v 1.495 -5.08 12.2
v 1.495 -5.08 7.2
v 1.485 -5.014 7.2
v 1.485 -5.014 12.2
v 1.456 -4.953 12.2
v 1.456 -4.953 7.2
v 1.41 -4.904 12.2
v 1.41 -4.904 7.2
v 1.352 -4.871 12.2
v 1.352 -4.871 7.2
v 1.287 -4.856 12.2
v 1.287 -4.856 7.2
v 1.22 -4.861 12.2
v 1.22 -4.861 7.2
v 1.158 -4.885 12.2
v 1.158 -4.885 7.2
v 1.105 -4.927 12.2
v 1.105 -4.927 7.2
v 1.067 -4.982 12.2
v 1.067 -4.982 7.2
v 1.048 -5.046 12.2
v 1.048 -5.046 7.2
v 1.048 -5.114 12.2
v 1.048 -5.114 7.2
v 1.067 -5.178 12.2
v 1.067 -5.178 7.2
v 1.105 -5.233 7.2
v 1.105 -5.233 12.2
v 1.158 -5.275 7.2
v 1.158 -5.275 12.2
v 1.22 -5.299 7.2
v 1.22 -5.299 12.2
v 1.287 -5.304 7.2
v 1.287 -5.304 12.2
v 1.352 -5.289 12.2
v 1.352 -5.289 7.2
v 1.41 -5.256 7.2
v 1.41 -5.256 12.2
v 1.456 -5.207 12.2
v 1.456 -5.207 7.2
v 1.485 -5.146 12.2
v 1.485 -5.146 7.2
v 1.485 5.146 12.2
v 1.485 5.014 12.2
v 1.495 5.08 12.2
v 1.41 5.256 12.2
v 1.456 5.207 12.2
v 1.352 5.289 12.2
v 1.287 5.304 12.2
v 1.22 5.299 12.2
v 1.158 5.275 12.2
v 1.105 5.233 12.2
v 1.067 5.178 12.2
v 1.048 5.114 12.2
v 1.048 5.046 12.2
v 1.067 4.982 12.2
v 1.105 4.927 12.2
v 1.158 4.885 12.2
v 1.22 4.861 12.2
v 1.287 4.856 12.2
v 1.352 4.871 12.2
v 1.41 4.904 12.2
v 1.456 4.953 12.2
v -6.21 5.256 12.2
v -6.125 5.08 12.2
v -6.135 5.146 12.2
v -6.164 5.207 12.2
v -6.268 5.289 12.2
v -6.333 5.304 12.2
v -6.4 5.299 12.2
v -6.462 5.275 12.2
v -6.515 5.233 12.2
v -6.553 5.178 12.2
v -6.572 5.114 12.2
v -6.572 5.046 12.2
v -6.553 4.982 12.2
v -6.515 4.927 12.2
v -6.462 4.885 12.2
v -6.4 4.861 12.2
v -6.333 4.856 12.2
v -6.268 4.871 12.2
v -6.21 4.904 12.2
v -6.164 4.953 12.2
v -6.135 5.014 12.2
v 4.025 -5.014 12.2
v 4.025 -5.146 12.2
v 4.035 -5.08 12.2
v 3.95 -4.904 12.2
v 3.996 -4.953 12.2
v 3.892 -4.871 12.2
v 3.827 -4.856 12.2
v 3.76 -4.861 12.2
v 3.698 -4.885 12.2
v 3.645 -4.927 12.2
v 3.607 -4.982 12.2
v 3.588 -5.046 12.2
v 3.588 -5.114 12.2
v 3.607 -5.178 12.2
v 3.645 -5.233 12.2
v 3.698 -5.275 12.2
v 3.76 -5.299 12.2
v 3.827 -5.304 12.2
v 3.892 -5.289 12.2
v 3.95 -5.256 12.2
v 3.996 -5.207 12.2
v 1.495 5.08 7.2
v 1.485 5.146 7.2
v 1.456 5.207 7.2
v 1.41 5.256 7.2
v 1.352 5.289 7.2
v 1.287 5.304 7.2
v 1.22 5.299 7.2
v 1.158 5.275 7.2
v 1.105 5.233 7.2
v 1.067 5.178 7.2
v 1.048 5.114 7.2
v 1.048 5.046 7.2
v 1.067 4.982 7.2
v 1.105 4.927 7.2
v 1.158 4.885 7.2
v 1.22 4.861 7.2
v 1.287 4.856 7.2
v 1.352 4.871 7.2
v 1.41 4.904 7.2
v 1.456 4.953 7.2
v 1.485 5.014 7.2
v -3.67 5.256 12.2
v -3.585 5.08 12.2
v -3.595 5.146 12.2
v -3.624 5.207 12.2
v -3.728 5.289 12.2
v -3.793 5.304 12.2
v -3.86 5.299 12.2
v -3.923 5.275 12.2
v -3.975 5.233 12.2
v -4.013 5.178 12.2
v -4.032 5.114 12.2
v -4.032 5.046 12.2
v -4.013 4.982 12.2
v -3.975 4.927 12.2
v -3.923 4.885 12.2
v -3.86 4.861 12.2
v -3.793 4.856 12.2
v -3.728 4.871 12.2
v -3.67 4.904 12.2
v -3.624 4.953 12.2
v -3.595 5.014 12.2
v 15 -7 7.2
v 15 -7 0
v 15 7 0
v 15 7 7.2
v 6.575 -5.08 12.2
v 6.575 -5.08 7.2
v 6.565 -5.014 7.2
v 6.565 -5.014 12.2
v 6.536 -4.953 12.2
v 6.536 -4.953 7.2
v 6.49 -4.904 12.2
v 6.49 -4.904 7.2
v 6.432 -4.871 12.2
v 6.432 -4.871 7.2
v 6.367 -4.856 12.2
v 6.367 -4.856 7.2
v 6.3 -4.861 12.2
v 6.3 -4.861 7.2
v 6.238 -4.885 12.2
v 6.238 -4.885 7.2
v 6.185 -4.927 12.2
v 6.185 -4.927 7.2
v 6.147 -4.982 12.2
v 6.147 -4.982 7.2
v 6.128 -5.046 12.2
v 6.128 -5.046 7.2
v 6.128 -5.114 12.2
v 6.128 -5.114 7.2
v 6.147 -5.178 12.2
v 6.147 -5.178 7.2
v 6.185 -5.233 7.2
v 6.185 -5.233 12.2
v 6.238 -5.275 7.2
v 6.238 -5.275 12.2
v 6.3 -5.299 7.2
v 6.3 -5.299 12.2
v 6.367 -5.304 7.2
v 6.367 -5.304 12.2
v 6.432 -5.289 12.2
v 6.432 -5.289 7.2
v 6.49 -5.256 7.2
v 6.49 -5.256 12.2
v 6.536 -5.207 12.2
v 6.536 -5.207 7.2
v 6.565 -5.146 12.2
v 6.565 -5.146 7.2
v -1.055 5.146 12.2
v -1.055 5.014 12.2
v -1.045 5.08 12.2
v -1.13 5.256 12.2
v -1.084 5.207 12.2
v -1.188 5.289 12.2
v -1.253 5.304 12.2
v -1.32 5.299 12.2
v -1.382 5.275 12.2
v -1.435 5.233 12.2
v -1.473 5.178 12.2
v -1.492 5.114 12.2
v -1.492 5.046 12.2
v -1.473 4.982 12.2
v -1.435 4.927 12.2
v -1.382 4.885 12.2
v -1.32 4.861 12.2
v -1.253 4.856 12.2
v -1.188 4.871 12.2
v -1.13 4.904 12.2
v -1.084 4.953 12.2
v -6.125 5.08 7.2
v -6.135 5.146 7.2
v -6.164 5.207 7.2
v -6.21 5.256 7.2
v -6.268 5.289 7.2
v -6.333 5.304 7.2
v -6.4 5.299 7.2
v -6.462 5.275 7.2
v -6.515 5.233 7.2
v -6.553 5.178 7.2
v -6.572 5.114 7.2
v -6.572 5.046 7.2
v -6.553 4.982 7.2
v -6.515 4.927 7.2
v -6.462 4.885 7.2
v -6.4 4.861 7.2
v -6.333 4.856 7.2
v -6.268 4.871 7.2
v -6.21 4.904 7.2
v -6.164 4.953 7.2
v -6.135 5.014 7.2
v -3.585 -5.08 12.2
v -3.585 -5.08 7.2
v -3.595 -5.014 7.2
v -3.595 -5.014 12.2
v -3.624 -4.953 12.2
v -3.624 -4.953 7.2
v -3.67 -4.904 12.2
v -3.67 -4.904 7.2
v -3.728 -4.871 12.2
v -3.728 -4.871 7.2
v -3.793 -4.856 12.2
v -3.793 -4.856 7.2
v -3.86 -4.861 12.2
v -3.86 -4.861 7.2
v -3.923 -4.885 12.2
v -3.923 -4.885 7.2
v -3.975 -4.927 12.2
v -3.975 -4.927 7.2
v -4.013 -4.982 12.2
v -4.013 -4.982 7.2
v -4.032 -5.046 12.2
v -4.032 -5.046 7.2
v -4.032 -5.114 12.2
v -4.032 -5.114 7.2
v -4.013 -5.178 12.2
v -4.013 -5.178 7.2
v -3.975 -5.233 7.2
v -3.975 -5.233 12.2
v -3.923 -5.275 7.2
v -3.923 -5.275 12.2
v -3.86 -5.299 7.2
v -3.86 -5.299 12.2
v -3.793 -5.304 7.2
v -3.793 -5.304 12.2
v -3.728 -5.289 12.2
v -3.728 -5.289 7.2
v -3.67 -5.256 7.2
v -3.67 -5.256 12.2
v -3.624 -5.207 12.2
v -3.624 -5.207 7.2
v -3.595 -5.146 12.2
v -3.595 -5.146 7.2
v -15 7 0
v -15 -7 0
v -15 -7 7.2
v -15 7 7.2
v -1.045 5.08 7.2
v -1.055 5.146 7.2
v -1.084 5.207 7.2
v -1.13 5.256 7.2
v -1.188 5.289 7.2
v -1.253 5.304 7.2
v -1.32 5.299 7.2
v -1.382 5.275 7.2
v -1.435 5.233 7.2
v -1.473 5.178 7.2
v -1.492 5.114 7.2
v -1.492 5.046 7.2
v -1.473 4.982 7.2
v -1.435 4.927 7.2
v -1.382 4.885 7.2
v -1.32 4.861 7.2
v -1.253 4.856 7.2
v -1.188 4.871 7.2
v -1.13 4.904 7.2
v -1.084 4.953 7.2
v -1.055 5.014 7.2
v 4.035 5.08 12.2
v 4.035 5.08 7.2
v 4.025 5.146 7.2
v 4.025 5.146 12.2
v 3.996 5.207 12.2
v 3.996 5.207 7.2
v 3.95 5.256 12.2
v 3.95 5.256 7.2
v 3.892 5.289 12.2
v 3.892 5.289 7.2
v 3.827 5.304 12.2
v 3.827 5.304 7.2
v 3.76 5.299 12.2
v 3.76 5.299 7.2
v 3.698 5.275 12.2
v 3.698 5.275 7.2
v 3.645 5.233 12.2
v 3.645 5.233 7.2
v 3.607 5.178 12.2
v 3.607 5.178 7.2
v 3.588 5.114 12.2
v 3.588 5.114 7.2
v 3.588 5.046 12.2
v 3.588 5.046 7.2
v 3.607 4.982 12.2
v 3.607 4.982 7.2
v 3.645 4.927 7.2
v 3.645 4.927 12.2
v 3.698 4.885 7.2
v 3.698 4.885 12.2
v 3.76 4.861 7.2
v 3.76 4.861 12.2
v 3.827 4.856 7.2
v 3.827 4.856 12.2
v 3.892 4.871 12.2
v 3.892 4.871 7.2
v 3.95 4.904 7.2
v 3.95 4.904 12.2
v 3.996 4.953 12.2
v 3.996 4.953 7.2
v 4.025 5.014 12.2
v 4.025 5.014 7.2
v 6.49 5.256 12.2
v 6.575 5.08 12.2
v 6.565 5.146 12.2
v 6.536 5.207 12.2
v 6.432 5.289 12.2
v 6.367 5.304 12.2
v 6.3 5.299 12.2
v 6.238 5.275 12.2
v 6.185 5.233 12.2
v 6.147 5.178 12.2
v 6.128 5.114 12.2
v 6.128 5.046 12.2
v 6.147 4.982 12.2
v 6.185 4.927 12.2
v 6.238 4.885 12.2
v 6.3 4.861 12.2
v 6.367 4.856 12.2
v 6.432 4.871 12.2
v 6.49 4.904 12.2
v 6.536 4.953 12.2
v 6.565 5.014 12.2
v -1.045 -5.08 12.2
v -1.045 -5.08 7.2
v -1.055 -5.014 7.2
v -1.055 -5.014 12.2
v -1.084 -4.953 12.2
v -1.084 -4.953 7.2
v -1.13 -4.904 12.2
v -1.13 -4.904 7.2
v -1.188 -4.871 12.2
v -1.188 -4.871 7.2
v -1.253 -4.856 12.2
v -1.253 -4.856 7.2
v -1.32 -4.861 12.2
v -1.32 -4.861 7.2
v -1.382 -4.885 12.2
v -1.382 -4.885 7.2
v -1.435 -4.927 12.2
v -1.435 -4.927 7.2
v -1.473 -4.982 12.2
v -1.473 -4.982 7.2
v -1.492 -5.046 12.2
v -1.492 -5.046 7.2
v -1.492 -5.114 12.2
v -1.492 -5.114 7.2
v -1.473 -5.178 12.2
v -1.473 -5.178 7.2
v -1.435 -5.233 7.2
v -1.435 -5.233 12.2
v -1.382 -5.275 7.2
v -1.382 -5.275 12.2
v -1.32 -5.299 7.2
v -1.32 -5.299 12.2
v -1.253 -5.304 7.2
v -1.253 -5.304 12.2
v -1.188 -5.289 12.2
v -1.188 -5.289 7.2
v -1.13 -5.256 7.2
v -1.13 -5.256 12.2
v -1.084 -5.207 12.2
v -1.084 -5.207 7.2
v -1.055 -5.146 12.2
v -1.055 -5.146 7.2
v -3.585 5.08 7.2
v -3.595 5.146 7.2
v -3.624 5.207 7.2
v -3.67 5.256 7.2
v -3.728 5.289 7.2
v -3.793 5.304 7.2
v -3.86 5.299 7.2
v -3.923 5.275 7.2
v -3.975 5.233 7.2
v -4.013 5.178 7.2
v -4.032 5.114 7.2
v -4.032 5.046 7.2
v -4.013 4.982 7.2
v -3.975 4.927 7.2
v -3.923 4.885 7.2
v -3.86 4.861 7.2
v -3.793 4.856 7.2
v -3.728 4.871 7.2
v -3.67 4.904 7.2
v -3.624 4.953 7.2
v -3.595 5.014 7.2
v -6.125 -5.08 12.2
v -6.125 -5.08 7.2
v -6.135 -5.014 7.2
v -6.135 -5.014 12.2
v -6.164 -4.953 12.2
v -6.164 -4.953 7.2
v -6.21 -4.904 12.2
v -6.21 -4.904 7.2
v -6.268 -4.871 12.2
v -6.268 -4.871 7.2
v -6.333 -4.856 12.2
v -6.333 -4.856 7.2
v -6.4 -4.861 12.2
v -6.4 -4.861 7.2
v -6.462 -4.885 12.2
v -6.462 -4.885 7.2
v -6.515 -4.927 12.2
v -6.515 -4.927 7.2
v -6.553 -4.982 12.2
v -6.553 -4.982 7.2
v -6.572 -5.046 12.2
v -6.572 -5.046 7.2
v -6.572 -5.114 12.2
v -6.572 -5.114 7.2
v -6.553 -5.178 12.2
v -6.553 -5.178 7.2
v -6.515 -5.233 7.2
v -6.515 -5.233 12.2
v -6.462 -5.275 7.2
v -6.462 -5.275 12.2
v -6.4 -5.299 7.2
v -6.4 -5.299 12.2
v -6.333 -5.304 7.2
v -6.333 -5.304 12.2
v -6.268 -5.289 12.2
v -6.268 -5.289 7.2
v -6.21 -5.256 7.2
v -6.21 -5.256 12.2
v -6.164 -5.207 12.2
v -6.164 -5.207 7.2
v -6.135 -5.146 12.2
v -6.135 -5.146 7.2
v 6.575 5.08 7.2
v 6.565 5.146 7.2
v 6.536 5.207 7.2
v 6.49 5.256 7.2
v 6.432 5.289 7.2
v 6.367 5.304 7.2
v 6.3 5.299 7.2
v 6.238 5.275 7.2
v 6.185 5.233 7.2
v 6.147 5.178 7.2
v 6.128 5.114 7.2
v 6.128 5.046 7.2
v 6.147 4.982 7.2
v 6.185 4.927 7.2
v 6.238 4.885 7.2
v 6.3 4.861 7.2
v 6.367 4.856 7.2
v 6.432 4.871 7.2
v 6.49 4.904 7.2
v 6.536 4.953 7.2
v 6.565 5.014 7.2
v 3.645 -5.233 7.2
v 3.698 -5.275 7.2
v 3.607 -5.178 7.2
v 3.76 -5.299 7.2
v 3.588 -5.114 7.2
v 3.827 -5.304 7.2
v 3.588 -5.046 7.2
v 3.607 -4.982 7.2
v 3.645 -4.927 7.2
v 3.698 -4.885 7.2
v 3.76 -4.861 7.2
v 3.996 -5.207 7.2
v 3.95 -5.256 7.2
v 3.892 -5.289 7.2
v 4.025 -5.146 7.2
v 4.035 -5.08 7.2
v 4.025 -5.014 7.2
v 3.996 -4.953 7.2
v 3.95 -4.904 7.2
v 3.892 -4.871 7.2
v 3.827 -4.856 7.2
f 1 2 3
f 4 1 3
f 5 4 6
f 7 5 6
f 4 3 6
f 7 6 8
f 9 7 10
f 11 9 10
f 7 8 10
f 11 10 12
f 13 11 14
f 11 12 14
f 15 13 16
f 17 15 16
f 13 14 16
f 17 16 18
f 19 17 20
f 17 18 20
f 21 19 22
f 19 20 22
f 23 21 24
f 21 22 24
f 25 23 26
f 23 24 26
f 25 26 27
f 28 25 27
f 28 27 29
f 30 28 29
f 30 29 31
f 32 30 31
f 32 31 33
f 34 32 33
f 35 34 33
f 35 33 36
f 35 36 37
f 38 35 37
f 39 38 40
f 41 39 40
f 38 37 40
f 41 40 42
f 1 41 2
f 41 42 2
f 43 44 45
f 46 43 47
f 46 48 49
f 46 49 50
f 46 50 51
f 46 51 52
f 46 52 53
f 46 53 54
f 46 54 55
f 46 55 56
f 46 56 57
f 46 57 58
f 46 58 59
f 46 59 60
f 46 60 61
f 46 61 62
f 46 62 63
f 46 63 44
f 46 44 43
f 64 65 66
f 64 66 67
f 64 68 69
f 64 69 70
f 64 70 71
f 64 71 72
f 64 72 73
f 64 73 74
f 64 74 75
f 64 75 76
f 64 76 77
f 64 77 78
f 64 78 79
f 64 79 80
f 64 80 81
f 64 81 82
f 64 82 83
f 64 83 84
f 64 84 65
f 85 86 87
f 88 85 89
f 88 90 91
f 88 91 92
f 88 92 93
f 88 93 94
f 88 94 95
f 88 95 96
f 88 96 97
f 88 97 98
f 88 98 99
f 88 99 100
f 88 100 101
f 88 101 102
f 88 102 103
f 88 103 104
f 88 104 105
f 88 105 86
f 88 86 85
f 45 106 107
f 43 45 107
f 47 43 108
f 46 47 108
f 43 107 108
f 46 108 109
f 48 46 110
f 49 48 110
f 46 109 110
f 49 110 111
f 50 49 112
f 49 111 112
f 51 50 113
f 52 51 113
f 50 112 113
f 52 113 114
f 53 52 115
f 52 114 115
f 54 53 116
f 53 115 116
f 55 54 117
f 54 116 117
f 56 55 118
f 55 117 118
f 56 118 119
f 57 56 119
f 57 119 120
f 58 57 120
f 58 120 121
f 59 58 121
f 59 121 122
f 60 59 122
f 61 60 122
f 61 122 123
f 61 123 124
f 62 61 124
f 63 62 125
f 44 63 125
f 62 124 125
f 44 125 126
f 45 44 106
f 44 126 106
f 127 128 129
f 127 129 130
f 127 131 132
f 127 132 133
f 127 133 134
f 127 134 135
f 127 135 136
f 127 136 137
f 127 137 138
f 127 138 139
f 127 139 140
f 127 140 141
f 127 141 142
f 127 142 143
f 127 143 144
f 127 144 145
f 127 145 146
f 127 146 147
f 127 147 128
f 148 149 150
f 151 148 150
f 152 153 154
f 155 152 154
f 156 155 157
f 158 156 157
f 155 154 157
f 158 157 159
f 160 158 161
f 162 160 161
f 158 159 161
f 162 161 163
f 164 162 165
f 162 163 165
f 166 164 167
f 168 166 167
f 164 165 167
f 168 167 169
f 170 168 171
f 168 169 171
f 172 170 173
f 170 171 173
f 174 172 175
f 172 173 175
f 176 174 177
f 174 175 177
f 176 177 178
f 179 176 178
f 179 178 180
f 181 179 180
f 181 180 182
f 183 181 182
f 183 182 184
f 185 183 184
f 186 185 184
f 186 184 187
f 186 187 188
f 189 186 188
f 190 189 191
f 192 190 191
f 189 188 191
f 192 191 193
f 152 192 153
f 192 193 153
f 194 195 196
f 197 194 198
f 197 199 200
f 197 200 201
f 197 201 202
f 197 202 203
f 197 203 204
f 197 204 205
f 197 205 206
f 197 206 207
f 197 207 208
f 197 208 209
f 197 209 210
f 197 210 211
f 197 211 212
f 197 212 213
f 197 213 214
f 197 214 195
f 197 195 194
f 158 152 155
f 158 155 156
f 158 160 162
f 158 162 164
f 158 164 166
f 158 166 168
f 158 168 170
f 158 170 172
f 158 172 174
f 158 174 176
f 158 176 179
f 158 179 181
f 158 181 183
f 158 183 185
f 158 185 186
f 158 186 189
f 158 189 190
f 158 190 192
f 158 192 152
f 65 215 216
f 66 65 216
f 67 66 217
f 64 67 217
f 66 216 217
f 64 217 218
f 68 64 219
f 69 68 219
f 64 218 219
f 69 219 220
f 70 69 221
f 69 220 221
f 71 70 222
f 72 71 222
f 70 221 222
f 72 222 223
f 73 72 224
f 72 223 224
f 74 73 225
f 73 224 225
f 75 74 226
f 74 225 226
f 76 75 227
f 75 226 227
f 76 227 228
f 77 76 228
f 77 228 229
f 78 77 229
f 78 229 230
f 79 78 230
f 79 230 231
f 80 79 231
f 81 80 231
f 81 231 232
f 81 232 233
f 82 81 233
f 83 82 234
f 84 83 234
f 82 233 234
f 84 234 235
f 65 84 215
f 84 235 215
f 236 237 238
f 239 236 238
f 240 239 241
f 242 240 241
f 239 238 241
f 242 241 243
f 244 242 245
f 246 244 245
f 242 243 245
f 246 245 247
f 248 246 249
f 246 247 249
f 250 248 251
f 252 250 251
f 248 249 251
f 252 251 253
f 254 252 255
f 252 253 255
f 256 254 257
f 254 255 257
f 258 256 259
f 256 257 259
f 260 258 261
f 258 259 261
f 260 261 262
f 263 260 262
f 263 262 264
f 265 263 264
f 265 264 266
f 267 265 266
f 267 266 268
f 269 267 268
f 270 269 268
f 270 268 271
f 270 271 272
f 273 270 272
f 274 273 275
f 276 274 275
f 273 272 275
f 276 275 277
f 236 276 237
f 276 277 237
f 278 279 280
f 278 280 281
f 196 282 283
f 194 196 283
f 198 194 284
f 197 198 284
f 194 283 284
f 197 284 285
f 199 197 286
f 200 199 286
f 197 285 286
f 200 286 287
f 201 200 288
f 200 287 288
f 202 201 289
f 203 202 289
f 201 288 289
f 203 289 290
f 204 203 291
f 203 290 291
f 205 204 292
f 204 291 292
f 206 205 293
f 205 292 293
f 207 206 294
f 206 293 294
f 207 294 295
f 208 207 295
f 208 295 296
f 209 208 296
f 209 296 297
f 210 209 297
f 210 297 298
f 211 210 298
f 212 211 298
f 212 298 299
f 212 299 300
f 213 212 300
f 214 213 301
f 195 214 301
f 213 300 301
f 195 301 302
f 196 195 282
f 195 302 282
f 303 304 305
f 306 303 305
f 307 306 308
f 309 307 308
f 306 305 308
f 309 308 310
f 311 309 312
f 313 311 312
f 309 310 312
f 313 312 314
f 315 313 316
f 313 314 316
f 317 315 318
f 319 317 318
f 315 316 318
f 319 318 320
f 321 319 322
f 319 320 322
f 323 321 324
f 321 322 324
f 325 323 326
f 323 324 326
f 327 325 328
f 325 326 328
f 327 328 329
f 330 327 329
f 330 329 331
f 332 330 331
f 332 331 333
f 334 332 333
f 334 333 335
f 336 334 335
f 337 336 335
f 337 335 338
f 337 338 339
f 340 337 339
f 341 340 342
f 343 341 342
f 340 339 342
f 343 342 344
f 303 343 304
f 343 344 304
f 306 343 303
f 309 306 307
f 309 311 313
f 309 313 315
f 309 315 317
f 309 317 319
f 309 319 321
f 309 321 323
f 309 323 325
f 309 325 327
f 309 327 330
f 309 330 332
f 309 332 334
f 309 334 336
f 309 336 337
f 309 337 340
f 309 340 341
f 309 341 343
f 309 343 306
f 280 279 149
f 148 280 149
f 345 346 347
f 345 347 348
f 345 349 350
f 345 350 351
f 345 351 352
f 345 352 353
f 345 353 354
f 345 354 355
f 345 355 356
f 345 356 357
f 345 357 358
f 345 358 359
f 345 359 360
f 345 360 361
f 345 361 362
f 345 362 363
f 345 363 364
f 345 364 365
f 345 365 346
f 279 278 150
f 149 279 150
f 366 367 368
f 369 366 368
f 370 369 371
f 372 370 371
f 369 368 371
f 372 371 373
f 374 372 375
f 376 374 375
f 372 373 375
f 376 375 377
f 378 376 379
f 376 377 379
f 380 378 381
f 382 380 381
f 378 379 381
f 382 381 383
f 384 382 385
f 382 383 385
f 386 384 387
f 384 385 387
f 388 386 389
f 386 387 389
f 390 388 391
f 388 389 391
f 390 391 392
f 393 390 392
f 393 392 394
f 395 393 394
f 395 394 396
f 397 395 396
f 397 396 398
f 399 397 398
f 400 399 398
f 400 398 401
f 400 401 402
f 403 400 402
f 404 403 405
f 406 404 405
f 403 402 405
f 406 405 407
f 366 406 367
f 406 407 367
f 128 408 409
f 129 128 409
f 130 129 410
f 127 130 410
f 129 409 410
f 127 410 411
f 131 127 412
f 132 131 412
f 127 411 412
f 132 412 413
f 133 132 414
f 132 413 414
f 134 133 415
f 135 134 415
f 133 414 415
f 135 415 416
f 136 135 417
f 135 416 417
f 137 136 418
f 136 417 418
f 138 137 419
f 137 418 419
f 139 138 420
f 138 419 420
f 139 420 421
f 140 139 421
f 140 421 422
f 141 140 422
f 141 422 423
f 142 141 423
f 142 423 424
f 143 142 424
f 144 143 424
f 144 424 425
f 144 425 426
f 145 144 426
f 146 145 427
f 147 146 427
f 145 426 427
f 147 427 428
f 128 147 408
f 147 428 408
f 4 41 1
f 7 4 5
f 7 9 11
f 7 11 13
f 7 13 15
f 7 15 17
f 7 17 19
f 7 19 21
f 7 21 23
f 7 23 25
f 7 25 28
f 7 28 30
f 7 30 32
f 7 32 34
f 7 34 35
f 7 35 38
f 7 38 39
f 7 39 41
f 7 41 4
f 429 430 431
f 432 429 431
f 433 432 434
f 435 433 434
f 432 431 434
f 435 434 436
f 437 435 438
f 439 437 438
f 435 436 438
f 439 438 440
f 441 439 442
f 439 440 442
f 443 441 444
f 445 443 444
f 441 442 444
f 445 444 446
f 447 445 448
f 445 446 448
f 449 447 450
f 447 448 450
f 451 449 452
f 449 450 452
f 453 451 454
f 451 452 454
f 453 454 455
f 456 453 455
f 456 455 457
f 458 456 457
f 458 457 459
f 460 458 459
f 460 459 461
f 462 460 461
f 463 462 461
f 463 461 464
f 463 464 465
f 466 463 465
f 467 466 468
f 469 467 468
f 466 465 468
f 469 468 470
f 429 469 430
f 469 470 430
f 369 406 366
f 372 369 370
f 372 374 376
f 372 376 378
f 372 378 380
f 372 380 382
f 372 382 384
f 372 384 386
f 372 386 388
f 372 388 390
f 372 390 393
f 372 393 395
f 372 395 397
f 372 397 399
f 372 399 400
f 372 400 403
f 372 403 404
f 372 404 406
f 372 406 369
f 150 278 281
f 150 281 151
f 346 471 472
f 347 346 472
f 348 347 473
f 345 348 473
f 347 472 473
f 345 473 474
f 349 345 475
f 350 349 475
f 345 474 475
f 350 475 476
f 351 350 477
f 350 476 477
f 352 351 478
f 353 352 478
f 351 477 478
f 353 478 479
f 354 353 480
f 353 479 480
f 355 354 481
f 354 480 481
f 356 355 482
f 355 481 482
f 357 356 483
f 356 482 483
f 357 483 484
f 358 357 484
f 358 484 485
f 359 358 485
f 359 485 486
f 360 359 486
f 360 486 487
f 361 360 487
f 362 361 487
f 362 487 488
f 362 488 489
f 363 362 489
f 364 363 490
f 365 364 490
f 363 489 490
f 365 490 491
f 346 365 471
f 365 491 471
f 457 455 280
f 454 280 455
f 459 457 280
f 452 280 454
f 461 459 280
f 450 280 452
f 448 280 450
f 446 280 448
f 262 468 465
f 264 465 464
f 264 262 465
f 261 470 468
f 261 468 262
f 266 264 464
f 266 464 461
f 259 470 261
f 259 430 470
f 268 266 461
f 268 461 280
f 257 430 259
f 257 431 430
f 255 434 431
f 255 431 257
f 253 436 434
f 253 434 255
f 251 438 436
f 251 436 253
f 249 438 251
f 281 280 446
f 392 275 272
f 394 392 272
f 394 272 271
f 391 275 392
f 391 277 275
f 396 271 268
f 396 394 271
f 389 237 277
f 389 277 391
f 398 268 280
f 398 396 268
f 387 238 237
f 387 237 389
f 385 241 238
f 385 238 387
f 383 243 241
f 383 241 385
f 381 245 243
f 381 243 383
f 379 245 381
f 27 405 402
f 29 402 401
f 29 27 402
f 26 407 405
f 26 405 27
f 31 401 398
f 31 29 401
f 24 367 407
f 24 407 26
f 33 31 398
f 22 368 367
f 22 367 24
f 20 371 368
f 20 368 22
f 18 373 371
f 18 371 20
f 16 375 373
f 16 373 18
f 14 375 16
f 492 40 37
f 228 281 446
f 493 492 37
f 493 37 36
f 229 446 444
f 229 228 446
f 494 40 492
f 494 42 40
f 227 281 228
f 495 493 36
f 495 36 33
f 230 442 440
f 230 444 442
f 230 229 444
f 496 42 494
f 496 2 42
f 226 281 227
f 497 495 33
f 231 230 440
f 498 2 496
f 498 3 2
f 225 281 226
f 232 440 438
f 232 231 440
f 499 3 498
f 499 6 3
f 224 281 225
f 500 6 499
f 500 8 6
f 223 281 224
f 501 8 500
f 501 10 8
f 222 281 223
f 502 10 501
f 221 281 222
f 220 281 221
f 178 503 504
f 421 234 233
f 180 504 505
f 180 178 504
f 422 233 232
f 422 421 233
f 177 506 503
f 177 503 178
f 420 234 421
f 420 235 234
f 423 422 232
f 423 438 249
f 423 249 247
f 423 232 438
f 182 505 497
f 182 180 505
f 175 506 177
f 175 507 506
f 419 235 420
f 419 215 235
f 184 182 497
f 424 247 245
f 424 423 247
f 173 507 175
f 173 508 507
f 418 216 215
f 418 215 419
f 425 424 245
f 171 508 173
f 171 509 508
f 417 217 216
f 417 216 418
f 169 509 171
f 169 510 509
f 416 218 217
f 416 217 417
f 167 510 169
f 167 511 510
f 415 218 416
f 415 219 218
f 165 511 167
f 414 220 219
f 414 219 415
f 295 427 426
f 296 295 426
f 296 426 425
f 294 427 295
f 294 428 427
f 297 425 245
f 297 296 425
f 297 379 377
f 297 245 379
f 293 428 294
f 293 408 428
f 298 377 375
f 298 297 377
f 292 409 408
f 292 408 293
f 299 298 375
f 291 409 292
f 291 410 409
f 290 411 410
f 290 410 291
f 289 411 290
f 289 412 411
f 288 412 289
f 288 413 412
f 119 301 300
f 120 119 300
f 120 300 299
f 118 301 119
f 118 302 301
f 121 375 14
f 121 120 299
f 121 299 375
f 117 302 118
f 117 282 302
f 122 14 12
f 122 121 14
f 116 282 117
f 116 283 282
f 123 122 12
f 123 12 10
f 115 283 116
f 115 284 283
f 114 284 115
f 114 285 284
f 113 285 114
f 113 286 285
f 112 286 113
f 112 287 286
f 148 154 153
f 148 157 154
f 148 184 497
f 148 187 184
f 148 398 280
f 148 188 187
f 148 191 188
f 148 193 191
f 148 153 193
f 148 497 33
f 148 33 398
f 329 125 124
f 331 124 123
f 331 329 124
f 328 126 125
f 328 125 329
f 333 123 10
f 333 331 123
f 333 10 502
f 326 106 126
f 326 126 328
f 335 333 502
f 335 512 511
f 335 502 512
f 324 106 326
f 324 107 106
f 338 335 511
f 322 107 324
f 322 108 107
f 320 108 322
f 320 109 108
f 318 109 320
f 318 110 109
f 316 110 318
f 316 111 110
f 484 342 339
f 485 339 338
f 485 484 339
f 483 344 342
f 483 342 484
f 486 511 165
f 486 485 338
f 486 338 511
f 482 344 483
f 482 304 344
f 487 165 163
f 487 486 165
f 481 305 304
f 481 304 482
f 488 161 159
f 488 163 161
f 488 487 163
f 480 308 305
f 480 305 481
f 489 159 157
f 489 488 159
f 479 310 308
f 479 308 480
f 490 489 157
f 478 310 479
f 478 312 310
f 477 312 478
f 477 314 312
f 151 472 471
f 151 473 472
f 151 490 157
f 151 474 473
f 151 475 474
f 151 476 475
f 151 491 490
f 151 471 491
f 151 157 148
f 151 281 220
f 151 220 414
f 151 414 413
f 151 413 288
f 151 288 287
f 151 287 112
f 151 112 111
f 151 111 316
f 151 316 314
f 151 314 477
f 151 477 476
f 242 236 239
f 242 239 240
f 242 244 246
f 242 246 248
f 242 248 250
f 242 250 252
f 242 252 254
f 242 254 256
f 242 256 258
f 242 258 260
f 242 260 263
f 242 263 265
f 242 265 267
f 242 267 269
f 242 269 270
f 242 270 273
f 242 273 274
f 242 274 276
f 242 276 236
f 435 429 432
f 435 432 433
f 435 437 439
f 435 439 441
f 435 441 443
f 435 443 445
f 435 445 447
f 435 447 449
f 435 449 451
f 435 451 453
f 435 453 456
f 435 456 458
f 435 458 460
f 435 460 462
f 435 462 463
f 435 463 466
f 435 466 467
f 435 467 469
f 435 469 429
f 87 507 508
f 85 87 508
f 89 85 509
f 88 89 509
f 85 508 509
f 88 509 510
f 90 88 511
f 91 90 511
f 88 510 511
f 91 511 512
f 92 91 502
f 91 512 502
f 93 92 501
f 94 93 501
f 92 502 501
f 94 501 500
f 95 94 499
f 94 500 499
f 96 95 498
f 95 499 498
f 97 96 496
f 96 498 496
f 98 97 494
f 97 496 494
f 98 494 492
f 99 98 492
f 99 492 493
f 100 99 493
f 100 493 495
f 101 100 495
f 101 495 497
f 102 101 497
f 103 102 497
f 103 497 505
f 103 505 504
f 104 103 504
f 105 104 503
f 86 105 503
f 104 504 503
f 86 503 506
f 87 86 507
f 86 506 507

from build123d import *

# Parameters (mm, degrees)
SKETCH001_W  = 30
SKETCH001_H  = 14
PAD_DEPTH    = 7.2
SKETCH002_R  = 0.225
PAD001_DEPTH = 5


with BuildPart() as part:
    # Sketch001 → Pad (new body)
    with BuildSketch(Plane.XY):
        Rectangle(SKETCH001_W, SKETCH001_H)
    extrude(amount=PAD_DEPTH)

    # Sketch002 (on Face6 of Pad) → Pad001 (join)
    with BuildSketch(Plane.XY.offset(7.2)):
        with Locations((-3.81, -5.08)):
            Circle(SKETCH002_R)
        with Locations((-6.35, -5.08)):
            Circle(SKETCH002_R)
        with Locations((-1.27, -5.08)):
            Circle(SKETCH002_R)
        with Locations((1.27, -5.08)):
            Circle(SKETCH002_R)
        with Locations((3.81, -5.08)):
            Circle(SKETCH002_R)
        with Locations((6.35, -5.08)):
            Circle(SKETCH002_R)
        with Locations((-3.81, 5.08)):
            Circle(SKETCH002_R)
        with Locations((-6.35, 5.08)):
            Circle(SKETCH002_R)
        with Locations((-1.27, 5.08)):
            Circle(SKETCH002_R)
        with Locations((1.27, 5.08)):
            Circle(SKETCH002_R)
        with Locations((3.81, 5.08)):
            Circle(SKETCH002_R)
        with Locations((6.35, 5.08)):
            Circle(SKETCH002_R)
    extrude(amount=PAD001_DEPTH)


solid = part.part
